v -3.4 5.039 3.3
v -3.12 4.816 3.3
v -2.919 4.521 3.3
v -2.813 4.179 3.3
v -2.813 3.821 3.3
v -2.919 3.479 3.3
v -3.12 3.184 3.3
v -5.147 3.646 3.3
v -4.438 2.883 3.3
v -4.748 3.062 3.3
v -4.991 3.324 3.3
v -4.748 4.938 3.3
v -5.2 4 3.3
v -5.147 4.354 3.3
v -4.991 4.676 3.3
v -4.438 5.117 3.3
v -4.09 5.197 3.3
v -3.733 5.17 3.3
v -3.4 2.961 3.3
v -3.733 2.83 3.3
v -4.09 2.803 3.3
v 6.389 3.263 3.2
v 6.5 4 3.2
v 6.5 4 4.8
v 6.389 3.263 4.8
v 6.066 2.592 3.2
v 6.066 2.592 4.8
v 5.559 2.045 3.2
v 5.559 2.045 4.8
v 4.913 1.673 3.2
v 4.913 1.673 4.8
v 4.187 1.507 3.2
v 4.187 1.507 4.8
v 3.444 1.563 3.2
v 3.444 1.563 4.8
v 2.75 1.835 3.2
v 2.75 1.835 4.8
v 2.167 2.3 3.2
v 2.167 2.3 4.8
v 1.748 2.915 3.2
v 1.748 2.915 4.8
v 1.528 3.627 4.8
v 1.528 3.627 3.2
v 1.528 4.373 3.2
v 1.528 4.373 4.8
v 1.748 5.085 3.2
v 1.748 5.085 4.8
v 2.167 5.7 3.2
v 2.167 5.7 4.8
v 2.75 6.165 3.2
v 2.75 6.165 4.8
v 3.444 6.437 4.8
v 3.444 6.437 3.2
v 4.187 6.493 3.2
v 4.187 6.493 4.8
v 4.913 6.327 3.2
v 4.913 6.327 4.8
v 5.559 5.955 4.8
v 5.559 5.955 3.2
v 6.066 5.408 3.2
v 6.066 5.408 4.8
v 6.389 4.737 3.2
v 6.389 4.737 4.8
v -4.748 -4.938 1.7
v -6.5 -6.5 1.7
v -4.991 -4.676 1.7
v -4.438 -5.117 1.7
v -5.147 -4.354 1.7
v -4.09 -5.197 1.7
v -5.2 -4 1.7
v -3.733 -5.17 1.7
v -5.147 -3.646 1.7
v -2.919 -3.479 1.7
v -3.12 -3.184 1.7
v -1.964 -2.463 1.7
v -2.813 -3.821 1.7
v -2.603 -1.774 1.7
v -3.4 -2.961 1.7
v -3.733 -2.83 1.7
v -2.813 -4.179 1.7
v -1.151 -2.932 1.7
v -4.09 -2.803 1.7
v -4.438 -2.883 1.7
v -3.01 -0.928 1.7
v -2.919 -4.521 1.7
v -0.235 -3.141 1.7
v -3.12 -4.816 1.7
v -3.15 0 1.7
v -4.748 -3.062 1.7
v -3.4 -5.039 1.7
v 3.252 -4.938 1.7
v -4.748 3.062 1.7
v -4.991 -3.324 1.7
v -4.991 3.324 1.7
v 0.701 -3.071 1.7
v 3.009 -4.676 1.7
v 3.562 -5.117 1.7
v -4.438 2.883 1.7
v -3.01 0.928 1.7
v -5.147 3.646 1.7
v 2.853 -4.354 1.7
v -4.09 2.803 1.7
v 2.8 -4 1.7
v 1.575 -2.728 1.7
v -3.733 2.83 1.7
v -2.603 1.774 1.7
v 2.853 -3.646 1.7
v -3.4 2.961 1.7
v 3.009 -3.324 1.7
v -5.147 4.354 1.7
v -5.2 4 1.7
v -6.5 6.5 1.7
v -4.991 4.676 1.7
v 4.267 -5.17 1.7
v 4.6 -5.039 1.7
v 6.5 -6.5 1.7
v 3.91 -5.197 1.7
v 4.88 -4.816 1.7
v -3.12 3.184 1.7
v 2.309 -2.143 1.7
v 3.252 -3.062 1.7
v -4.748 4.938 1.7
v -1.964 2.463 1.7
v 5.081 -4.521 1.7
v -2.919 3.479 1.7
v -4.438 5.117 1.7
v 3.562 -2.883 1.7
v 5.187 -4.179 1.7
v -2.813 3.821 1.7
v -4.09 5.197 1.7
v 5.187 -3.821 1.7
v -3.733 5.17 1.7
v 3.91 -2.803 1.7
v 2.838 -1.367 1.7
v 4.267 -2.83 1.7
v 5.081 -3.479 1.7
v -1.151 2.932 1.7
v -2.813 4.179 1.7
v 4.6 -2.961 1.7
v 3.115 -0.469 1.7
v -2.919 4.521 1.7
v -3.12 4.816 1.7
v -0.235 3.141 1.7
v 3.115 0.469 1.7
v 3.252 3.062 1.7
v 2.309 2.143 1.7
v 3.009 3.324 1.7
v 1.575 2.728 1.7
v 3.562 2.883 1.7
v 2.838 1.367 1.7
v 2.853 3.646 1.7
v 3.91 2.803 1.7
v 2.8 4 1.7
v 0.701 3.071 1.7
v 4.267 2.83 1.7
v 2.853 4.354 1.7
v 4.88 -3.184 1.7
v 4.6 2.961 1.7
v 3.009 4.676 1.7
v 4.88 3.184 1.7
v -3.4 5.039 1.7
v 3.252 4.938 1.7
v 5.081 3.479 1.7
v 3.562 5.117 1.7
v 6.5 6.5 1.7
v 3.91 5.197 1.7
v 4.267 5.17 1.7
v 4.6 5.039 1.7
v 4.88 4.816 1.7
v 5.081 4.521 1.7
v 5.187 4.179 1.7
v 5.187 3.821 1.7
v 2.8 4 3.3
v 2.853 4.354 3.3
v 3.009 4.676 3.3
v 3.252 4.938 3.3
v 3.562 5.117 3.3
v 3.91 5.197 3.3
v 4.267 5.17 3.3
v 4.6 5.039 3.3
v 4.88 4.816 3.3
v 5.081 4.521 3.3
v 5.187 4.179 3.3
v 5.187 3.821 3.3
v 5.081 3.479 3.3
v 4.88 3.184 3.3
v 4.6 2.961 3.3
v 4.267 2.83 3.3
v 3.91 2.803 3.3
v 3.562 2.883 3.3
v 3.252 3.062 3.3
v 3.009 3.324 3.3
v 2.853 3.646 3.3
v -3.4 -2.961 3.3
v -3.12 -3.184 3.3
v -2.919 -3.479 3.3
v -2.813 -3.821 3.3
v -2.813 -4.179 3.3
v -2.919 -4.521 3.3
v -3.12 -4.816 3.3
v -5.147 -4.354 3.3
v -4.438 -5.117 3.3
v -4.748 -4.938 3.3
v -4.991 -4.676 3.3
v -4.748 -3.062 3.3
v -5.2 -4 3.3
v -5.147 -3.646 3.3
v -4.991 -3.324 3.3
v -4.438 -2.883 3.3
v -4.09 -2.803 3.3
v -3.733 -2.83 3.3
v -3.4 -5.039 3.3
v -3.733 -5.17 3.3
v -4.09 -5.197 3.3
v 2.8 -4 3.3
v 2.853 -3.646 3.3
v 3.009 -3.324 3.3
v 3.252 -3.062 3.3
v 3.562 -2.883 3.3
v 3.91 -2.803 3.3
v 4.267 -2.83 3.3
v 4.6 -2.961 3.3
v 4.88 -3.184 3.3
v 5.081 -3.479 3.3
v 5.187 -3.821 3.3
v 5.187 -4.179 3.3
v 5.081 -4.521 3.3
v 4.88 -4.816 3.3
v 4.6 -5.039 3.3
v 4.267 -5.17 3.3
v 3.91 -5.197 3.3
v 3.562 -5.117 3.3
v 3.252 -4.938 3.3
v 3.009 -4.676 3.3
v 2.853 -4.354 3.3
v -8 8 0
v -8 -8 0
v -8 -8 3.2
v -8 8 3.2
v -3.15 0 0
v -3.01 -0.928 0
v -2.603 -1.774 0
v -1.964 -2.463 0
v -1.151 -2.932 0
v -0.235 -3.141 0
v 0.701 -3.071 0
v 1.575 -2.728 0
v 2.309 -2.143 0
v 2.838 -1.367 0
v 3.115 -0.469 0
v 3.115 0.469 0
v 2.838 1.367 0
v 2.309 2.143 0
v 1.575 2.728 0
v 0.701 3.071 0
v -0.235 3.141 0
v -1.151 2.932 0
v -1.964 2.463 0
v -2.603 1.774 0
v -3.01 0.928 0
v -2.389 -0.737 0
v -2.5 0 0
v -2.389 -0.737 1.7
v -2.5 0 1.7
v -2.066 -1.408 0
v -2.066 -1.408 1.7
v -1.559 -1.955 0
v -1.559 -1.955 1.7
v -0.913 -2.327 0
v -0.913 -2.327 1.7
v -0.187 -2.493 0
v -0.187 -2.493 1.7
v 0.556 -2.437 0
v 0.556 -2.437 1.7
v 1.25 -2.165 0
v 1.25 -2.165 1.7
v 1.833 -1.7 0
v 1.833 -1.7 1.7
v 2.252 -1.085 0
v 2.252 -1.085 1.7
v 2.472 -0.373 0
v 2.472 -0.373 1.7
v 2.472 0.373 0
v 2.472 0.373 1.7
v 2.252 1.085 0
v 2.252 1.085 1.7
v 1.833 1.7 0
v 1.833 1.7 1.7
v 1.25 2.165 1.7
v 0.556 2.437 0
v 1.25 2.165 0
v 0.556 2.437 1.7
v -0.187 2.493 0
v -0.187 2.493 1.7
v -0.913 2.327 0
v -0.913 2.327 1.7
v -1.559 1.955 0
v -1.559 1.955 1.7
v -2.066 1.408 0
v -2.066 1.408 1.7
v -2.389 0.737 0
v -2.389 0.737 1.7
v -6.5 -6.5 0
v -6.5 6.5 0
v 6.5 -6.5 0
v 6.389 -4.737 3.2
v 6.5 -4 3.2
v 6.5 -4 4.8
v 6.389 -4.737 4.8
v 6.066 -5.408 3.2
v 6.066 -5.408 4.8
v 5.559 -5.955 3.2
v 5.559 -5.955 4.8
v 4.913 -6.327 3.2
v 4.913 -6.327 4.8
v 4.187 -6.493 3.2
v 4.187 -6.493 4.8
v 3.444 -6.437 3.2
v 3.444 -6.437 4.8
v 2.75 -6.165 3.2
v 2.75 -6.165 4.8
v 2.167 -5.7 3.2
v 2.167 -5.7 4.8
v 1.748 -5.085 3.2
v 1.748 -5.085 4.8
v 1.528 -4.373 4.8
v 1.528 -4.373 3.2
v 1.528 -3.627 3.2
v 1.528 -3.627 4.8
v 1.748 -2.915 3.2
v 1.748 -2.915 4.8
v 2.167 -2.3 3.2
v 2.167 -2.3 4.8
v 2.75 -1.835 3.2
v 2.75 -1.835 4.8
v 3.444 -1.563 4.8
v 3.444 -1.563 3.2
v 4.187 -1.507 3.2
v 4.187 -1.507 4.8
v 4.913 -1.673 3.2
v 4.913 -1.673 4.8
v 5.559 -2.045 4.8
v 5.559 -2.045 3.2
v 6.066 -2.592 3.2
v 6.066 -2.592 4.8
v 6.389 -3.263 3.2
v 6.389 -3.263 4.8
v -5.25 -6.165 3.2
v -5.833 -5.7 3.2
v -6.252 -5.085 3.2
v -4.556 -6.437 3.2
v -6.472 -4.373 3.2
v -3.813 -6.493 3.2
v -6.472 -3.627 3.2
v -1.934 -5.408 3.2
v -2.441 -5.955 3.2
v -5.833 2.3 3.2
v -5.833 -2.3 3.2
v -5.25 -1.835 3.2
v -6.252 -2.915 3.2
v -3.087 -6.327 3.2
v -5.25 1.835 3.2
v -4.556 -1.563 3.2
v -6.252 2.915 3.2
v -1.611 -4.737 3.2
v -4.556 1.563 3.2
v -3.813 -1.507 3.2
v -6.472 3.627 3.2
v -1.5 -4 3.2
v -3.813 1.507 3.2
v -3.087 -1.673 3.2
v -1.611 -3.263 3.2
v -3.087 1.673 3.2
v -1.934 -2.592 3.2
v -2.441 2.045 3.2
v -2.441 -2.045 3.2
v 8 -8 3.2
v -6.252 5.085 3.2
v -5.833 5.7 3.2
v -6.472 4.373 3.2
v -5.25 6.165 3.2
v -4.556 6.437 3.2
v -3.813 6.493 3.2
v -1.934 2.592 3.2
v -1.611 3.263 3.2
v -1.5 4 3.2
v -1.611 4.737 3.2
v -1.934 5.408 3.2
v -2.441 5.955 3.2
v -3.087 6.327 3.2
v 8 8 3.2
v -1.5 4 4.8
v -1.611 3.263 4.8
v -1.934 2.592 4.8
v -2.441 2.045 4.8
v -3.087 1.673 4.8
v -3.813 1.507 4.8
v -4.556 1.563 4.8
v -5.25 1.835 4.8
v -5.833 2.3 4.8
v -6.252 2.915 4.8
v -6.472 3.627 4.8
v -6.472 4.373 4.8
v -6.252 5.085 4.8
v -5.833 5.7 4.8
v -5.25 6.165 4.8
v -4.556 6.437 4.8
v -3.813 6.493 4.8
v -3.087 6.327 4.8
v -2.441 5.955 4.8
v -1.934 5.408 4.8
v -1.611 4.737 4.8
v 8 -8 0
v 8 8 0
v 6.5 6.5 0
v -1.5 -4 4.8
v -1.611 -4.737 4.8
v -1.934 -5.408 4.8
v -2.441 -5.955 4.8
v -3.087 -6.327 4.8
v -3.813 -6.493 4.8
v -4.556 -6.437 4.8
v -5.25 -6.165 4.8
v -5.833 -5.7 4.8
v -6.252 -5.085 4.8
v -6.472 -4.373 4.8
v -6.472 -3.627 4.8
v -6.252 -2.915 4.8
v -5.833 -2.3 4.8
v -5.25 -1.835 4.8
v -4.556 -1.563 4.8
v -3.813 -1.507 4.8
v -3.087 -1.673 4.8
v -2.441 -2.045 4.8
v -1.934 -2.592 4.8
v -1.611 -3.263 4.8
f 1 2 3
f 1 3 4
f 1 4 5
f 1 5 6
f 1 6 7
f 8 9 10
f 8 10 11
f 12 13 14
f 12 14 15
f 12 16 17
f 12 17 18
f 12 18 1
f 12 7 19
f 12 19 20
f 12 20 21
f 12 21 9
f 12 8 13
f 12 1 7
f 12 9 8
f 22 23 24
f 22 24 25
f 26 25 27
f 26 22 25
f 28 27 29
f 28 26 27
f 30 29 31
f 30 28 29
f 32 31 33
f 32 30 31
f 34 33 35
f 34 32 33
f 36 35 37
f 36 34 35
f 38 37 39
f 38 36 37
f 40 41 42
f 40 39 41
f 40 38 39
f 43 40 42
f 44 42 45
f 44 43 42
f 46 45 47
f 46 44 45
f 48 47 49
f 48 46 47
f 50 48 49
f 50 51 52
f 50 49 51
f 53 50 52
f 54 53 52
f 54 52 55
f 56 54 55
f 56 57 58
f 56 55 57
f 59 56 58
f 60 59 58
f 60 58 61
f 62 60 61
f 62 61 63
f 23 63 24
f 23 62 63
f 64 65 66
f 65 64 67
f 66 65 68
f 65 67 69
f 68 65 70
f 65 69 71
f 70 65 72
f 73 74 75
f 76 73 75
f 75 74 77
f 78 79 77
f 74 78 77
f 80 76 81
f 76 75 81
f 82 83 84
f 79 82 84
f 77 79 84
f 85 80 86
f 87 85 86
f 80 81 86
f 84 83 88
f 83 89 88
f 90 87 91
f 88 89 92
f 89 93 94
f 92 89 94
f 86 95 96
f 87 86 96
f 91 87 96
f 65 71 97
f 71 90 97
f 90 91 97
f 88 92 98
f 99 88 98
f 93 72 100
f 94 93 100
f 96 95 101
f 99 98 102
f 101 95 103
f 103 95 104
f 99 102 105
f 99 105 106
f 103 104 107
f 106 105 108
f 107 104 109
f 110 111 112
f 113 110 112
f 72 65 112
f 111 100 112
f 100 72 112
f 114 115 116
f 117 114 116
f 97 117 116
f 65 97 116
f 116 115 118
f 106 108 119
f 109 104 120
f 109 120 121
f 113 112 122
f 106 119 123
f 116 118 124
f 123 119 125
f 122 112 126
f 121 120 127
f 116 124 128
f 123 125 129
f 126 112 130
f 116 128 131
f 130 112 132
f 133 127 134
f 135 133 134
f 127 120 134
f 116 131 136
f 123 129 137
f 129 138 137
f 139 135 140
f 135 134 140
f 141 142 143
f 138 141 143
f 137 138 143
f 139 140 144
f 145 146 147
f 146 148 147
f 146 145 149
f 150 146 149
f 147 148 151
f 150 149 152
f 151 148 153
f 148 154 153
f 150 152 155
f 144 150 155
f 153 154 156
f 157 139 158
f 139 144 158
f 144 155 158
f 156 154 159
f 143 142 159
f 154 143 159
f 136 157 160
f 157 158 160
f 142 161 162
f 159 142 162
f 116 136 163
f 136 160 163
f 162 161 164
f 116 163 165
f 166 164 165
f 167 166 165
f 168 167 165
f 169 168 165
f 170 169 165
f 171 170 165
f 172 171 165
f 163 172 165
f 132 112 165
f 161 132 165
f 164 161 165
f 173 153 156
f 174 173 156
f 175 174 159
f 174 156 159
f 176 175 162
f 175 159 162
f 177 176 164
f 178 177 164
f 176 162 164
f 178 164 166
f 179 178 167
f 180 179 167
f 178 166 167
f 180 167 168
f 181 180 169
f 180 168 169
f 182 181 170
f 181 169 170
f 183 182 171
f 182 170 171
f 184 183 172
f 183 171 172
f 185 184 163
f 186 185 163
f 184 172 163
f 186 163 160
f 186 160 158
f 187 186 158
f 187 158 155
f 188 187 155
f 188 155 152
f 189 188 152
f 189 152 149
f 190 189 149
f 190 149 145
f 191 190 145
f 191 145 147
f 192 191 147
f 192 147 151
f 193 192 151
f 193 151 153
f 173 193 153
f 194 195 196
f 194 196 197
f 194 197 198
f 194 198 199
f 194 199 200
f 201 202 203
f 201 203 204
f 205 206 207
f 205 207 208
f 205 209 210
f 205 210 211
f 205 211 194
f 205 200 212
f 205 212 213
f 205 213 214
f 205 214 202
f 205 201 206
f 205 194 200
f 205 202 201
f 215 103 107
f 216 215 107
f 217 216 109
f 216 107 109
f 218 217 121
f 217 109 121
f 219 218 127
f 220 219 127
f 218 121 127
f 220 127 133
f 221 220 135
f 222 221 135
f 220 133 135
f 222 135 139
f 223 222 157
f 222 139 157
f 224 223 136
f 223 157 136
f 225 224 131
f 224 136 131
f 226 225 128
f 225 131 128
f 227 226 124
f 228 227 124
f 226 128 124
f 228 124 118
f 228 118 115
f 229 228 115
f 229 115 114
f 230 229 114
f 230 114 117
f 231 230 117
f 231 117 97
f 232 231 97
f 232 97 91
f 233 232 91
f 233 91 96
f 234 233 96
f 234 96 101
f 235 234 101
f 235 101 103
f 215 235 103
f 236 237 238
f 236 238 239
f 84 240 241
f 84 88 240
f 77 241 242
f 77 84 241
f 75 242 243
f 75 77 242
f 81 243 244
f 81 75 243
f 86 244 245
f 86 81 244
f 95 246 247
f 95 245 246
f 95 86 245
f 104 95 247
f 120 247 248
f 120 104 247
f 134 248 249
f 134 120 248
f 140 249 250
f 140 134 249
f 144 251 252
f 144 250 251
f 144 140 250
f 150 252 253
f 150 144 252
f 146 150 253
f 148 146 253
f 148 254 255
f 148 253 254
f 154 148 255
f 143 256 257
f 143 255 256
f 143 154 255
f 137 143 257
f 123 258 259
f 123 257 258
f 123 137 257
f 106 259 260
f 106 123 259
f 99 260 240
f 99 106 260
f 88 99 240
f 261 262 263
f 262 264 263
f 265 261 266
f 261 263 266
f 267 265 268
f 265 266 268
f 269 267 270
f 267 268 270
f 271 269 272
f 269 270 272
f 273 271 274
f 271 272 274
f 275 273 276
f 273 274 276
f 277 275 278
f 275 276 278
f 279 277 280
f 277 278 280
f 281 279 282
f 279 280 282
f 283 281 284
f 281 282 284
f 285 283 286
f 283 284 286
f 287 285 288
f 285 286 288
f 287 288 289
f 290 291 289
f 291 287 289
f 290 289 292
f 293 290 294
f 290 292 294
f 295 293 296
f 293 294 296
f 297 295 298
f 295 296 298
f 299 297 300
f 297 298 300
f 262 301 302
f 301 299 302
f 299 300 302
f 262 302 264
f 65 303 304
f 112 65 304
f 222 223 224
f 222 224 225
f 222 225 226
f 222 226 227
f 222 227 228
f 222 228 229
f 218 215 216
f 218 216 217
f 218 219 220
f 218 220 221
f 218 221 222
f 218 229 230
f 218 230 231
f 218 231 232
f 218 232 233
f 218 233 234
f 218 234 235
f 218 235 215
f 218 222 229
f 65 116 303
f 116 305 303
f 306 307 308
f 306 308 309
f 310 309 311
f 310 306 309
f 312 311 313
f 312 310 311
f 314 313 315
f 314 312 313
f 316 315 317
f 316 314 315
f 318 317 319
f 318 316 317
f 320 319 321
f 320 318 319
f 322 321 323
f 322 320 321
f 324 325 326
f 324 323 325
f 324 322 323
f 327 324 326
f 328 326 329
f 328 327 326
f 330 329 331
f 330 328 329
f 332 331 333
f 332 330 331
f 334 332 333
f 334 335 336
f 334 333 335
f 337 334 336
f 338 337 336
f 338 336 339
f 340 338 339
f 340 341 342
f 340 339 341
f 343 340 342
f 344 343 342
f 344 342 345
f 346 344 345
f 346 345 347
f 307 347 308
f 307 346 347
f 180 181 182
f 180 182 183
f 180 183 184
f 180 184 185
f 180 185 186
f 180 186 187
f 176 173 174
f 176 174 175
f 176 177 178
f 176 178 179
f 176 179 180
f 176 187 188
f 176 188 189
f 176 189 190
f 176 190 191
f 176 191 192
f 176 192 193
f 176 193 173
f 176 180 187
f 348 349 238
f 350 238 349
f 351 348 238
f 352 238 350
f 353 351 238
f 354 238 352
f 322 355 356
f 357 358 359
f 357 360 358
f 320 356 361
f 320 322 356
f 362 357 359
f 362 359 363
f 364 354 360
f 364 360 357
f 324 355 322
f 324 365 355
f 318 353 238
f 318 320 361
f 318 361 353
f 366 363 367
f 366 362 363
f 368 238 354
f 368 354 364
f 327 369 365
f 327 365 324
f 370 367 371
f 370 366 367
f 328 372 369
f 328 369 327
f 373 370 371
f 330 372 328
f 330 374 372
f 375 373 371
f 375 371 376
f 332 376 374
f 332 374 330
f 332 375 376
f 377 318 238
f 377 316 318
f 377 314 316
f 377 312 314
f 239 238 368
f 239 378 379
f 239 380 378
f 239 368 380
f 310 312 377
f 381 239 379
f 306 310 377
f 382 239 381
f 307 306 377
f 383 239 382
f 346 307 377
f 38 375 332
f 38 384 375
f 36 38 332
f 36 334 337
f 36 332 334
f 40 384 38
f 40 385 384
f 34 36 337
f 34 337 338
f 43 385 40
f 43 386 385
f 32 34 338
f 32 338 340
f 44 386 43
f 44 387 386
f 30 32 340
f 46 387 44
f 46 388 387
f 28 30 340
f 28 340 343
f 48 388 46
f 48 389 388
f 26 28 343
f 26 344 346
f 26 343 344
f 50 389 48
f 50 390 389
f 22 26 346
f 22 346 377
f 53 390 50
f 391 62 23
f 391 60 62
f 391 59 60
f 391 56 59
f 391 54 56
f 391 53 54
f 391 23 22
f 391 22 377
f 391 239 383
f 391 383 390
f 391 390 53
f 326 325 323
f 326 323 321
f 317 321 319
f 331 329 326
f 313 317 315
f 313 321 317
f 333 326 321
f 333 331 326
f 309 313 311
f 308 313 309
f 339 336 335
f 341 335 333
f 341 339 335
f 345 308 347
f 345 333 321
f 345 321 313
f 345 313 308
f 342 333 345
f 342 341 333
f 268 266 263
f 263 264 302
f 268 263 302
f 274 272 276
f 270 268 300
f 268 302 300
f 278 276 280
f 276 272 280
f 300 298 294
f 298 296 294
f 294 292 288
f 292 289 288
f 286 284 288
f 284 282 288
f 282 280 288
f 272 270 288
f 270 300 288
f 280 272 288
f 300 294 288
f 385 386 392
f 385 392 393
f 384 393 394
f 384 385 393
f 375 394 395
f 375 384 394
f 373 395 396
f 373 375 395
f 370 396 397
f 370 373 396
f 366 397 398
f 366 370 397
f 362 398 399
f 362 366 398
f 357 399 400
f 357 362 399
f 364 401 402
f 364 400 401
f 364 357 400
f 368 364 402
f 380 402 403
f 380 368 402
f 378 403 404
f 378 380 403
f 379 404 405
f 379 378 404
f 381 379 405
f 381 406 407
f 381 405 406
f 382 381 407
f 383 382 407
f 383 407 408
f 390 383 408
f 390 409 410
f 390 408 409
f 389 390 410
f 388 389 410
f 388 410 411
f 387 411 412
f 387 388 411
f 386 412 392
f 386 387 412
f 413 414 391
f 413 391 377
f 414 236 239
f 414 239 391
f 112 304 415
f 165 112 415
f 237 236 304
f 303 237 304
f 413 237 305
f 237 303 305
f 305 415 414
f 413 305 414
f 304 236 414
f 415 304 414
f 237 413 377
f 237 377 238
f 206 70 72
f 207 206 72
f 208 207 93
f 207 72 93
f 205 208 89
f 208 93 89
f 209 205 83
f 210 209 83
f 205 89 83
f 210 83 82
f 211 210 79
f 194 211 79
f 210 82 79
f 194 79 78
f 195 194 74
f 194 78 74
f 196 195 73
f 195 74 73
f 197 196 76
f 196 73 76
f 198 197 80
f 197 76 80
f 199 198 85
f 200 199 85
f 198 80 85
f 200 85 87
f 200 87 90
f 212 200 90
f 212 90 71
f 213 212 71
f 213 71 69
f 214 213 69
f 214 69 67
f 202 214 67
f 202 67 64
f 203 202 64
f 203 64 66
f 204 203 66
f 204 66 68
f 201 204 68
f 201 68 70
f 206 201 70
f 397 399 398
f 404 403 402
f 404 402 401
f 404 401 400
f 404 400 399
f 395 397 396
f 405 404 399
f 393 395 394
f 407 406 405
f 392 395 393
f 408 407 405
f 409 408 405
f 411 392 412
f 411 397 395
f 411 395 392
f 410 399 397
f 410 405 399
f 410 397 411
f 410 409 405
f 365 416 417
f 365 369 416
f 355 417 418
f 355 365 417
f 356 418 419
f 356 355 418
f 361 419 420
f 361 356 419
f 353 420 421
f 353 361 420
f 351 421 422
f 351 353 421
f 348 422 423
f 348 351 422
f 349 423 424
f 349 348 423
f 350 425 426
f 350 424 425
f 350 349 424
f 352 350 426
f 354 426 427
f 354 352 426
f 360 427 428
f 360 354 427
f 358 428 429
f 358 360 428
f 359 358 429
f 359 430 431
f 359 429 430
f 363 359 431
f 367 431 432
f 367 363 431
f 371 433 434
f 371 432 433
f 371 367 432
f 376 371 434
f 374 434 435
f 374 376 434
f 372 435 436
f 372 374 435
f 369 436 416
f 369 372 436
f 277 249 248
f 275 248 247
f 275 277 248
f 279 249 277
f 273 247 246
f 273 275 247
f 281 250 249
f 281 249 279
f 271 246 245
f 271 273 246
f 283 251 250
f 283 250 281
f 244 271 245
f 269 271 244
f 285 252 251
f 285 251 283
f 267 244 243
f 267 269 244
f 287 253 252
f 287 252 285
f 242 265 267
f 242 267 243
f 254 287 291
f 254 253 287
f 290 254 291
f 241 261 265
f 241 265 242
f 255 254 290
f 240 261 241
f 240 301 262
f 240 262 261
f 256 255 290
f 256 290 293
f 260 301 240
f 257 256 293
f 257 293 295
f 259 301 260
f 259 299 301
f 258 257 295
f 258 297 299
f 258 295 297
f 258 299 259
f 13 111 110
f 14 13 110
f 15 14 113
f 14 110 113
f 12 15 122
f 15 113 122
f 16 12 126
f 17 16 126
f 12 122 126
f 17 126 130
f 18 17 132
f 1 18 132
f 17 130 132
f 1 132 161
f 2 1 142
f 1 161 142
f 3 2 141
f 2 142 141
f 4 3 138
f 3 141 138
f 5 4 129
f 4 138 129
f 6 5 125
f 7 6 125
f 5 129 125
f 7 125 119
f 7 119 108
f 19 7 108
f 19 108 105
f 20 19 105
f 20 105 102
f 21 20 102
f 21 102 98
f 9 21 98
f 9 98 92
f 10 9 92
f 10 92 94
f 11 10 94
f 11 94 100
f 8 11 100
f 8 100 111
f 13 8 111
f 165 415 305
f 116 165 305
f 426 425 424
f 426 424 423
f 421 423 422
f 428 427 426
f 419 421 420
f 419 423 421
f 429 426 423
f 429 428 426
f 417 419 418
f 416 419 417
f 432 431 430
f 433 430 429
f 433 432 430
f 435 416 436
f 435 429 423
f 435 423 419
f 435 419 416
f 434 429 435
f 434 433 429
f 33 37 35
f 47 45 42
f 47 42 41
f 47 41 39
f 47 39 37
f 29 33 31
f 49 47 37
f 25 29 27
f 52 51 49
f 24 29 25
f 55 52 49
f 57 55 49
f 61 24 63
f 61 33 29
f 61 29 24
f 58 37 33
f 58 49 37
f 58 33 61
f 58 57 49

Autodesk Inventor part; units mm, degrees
ref_plane "YZ Plane" through (0, 0, 0) normal (1, 0, 0) x (0, 1, 0)
ref_plane "XZ Plane" through (0, 0, 0) normal (0, 1, 0) x (-1, 0, 0)
ref_plane "XY Plane" through (0, 0, 0) normal (0, 0, 1) x (1, 0, 0)
sketch "Sketch1" plane through (0, 0, 0) normal (0, 0, 1) x (1, 0, 0)
  line L0 (-8, 8) -> (8, 8)
  line L1 (8, 8) -> (8, -8)
  line L2 (8, -8) -> (-8, -8)
  line L3 (-8, -8) -> (-8, 8)
  point P0 (0, 0)
  dimension "d0" = 16
  dimension "d1" = 16
  dimension "d2" = 8
  dimension "d3" = 8
extrude "Extrusion1" add sketch "Sketch1" along normal blind 3.2
shell "Shell1" thickness 1.5 removed faces 1 at (-2.6667, -2.6667, 0)
sketch "Sketch2" plane through (0, 0, 3.2) normal (0, 0, 1) x (1, 0, 0)
  circle A0 centre (4, -4) radius 2.5
  line L0 (8, 8) -> (8, -8) projected
  line L1 (8, -8) -> (-8, -8) projected
  dimension "d7" = 5
  dimension "d10" = 4
  dimension "d11" = 4
extrude "Extrusion2" add sketch "Sketch2" along normal blind 1.6
sketch "Sketch3" plane through (6.5, -6.5, 1.7) normal (0, 0, -1) x (-1, 0, 0)
  circle A0 centre (2.5, 2.5) radius 2.5 projected
  circle A1 centre (2.5, 2.5) radius 1.2
  point P0 (6.5, 6.5)
  dimension "d18" = 2.4
extrude "Extrusion3" cut sketch "Sketch3" against normal blind 1.6 contours A1
pattern_linear "Rectangular Pattern1" count 2 spacing 8 along (0, 1, 0) count 2 spacing 8 along (-1, 0, 0) of "Extrusion2", "Extrusion3"
sketch "Sketch4" plane through (6.5, -6.5, 1.7) normal (0, 0, -1) x (-1, 0, 0)
  circle A0 centre (2.5, 10.5) radius 1.2 projected
  circle A1 centre (2.5, 2.5) radius 1.2 projected
  line L0 (0, 13) -> (0, 0) projected
  line L1 (0, 0) -> (13, 0) projected
  circle A2 centre (6.5, 6.5) radius 3.15
  circle A3 centre (6.5, 6.5) radius 2.5
  point P0 (6.5, 6.5)
  dimension "d21" = 6.5
  dimension "d22" = 6.5
  dimension "d23" = 10.5
  dimension "d24" = 2.5
  dimension "d25" = 5
  dimension "d26" = 6.3
extrude "Extrusion4" add sketch "Sketch4" along normal up to surface (1.7 mm away) contours A2
pattern_of_one "Rectangular Pattern2"
equation "\"d0\" = 8 * WIDTH"
equation "\"d1\" = 8 * LENGTH"
equation "\"d2\" = 0.5 * d0"
equation "\"d3\" = 0.5 * d1"
equation "\"d4\" = HEIGHT"
equation "\"d21\" = 0.5 * d23 + 0.5 * d24"
equation "\"d22\" = d21"
equation "\"WIDTH\" = 2"
equation "\"HEIGHT\" = 3.2"
equation "\"LENGTH\" = 2"
properties part number "3022" material "Steel"
